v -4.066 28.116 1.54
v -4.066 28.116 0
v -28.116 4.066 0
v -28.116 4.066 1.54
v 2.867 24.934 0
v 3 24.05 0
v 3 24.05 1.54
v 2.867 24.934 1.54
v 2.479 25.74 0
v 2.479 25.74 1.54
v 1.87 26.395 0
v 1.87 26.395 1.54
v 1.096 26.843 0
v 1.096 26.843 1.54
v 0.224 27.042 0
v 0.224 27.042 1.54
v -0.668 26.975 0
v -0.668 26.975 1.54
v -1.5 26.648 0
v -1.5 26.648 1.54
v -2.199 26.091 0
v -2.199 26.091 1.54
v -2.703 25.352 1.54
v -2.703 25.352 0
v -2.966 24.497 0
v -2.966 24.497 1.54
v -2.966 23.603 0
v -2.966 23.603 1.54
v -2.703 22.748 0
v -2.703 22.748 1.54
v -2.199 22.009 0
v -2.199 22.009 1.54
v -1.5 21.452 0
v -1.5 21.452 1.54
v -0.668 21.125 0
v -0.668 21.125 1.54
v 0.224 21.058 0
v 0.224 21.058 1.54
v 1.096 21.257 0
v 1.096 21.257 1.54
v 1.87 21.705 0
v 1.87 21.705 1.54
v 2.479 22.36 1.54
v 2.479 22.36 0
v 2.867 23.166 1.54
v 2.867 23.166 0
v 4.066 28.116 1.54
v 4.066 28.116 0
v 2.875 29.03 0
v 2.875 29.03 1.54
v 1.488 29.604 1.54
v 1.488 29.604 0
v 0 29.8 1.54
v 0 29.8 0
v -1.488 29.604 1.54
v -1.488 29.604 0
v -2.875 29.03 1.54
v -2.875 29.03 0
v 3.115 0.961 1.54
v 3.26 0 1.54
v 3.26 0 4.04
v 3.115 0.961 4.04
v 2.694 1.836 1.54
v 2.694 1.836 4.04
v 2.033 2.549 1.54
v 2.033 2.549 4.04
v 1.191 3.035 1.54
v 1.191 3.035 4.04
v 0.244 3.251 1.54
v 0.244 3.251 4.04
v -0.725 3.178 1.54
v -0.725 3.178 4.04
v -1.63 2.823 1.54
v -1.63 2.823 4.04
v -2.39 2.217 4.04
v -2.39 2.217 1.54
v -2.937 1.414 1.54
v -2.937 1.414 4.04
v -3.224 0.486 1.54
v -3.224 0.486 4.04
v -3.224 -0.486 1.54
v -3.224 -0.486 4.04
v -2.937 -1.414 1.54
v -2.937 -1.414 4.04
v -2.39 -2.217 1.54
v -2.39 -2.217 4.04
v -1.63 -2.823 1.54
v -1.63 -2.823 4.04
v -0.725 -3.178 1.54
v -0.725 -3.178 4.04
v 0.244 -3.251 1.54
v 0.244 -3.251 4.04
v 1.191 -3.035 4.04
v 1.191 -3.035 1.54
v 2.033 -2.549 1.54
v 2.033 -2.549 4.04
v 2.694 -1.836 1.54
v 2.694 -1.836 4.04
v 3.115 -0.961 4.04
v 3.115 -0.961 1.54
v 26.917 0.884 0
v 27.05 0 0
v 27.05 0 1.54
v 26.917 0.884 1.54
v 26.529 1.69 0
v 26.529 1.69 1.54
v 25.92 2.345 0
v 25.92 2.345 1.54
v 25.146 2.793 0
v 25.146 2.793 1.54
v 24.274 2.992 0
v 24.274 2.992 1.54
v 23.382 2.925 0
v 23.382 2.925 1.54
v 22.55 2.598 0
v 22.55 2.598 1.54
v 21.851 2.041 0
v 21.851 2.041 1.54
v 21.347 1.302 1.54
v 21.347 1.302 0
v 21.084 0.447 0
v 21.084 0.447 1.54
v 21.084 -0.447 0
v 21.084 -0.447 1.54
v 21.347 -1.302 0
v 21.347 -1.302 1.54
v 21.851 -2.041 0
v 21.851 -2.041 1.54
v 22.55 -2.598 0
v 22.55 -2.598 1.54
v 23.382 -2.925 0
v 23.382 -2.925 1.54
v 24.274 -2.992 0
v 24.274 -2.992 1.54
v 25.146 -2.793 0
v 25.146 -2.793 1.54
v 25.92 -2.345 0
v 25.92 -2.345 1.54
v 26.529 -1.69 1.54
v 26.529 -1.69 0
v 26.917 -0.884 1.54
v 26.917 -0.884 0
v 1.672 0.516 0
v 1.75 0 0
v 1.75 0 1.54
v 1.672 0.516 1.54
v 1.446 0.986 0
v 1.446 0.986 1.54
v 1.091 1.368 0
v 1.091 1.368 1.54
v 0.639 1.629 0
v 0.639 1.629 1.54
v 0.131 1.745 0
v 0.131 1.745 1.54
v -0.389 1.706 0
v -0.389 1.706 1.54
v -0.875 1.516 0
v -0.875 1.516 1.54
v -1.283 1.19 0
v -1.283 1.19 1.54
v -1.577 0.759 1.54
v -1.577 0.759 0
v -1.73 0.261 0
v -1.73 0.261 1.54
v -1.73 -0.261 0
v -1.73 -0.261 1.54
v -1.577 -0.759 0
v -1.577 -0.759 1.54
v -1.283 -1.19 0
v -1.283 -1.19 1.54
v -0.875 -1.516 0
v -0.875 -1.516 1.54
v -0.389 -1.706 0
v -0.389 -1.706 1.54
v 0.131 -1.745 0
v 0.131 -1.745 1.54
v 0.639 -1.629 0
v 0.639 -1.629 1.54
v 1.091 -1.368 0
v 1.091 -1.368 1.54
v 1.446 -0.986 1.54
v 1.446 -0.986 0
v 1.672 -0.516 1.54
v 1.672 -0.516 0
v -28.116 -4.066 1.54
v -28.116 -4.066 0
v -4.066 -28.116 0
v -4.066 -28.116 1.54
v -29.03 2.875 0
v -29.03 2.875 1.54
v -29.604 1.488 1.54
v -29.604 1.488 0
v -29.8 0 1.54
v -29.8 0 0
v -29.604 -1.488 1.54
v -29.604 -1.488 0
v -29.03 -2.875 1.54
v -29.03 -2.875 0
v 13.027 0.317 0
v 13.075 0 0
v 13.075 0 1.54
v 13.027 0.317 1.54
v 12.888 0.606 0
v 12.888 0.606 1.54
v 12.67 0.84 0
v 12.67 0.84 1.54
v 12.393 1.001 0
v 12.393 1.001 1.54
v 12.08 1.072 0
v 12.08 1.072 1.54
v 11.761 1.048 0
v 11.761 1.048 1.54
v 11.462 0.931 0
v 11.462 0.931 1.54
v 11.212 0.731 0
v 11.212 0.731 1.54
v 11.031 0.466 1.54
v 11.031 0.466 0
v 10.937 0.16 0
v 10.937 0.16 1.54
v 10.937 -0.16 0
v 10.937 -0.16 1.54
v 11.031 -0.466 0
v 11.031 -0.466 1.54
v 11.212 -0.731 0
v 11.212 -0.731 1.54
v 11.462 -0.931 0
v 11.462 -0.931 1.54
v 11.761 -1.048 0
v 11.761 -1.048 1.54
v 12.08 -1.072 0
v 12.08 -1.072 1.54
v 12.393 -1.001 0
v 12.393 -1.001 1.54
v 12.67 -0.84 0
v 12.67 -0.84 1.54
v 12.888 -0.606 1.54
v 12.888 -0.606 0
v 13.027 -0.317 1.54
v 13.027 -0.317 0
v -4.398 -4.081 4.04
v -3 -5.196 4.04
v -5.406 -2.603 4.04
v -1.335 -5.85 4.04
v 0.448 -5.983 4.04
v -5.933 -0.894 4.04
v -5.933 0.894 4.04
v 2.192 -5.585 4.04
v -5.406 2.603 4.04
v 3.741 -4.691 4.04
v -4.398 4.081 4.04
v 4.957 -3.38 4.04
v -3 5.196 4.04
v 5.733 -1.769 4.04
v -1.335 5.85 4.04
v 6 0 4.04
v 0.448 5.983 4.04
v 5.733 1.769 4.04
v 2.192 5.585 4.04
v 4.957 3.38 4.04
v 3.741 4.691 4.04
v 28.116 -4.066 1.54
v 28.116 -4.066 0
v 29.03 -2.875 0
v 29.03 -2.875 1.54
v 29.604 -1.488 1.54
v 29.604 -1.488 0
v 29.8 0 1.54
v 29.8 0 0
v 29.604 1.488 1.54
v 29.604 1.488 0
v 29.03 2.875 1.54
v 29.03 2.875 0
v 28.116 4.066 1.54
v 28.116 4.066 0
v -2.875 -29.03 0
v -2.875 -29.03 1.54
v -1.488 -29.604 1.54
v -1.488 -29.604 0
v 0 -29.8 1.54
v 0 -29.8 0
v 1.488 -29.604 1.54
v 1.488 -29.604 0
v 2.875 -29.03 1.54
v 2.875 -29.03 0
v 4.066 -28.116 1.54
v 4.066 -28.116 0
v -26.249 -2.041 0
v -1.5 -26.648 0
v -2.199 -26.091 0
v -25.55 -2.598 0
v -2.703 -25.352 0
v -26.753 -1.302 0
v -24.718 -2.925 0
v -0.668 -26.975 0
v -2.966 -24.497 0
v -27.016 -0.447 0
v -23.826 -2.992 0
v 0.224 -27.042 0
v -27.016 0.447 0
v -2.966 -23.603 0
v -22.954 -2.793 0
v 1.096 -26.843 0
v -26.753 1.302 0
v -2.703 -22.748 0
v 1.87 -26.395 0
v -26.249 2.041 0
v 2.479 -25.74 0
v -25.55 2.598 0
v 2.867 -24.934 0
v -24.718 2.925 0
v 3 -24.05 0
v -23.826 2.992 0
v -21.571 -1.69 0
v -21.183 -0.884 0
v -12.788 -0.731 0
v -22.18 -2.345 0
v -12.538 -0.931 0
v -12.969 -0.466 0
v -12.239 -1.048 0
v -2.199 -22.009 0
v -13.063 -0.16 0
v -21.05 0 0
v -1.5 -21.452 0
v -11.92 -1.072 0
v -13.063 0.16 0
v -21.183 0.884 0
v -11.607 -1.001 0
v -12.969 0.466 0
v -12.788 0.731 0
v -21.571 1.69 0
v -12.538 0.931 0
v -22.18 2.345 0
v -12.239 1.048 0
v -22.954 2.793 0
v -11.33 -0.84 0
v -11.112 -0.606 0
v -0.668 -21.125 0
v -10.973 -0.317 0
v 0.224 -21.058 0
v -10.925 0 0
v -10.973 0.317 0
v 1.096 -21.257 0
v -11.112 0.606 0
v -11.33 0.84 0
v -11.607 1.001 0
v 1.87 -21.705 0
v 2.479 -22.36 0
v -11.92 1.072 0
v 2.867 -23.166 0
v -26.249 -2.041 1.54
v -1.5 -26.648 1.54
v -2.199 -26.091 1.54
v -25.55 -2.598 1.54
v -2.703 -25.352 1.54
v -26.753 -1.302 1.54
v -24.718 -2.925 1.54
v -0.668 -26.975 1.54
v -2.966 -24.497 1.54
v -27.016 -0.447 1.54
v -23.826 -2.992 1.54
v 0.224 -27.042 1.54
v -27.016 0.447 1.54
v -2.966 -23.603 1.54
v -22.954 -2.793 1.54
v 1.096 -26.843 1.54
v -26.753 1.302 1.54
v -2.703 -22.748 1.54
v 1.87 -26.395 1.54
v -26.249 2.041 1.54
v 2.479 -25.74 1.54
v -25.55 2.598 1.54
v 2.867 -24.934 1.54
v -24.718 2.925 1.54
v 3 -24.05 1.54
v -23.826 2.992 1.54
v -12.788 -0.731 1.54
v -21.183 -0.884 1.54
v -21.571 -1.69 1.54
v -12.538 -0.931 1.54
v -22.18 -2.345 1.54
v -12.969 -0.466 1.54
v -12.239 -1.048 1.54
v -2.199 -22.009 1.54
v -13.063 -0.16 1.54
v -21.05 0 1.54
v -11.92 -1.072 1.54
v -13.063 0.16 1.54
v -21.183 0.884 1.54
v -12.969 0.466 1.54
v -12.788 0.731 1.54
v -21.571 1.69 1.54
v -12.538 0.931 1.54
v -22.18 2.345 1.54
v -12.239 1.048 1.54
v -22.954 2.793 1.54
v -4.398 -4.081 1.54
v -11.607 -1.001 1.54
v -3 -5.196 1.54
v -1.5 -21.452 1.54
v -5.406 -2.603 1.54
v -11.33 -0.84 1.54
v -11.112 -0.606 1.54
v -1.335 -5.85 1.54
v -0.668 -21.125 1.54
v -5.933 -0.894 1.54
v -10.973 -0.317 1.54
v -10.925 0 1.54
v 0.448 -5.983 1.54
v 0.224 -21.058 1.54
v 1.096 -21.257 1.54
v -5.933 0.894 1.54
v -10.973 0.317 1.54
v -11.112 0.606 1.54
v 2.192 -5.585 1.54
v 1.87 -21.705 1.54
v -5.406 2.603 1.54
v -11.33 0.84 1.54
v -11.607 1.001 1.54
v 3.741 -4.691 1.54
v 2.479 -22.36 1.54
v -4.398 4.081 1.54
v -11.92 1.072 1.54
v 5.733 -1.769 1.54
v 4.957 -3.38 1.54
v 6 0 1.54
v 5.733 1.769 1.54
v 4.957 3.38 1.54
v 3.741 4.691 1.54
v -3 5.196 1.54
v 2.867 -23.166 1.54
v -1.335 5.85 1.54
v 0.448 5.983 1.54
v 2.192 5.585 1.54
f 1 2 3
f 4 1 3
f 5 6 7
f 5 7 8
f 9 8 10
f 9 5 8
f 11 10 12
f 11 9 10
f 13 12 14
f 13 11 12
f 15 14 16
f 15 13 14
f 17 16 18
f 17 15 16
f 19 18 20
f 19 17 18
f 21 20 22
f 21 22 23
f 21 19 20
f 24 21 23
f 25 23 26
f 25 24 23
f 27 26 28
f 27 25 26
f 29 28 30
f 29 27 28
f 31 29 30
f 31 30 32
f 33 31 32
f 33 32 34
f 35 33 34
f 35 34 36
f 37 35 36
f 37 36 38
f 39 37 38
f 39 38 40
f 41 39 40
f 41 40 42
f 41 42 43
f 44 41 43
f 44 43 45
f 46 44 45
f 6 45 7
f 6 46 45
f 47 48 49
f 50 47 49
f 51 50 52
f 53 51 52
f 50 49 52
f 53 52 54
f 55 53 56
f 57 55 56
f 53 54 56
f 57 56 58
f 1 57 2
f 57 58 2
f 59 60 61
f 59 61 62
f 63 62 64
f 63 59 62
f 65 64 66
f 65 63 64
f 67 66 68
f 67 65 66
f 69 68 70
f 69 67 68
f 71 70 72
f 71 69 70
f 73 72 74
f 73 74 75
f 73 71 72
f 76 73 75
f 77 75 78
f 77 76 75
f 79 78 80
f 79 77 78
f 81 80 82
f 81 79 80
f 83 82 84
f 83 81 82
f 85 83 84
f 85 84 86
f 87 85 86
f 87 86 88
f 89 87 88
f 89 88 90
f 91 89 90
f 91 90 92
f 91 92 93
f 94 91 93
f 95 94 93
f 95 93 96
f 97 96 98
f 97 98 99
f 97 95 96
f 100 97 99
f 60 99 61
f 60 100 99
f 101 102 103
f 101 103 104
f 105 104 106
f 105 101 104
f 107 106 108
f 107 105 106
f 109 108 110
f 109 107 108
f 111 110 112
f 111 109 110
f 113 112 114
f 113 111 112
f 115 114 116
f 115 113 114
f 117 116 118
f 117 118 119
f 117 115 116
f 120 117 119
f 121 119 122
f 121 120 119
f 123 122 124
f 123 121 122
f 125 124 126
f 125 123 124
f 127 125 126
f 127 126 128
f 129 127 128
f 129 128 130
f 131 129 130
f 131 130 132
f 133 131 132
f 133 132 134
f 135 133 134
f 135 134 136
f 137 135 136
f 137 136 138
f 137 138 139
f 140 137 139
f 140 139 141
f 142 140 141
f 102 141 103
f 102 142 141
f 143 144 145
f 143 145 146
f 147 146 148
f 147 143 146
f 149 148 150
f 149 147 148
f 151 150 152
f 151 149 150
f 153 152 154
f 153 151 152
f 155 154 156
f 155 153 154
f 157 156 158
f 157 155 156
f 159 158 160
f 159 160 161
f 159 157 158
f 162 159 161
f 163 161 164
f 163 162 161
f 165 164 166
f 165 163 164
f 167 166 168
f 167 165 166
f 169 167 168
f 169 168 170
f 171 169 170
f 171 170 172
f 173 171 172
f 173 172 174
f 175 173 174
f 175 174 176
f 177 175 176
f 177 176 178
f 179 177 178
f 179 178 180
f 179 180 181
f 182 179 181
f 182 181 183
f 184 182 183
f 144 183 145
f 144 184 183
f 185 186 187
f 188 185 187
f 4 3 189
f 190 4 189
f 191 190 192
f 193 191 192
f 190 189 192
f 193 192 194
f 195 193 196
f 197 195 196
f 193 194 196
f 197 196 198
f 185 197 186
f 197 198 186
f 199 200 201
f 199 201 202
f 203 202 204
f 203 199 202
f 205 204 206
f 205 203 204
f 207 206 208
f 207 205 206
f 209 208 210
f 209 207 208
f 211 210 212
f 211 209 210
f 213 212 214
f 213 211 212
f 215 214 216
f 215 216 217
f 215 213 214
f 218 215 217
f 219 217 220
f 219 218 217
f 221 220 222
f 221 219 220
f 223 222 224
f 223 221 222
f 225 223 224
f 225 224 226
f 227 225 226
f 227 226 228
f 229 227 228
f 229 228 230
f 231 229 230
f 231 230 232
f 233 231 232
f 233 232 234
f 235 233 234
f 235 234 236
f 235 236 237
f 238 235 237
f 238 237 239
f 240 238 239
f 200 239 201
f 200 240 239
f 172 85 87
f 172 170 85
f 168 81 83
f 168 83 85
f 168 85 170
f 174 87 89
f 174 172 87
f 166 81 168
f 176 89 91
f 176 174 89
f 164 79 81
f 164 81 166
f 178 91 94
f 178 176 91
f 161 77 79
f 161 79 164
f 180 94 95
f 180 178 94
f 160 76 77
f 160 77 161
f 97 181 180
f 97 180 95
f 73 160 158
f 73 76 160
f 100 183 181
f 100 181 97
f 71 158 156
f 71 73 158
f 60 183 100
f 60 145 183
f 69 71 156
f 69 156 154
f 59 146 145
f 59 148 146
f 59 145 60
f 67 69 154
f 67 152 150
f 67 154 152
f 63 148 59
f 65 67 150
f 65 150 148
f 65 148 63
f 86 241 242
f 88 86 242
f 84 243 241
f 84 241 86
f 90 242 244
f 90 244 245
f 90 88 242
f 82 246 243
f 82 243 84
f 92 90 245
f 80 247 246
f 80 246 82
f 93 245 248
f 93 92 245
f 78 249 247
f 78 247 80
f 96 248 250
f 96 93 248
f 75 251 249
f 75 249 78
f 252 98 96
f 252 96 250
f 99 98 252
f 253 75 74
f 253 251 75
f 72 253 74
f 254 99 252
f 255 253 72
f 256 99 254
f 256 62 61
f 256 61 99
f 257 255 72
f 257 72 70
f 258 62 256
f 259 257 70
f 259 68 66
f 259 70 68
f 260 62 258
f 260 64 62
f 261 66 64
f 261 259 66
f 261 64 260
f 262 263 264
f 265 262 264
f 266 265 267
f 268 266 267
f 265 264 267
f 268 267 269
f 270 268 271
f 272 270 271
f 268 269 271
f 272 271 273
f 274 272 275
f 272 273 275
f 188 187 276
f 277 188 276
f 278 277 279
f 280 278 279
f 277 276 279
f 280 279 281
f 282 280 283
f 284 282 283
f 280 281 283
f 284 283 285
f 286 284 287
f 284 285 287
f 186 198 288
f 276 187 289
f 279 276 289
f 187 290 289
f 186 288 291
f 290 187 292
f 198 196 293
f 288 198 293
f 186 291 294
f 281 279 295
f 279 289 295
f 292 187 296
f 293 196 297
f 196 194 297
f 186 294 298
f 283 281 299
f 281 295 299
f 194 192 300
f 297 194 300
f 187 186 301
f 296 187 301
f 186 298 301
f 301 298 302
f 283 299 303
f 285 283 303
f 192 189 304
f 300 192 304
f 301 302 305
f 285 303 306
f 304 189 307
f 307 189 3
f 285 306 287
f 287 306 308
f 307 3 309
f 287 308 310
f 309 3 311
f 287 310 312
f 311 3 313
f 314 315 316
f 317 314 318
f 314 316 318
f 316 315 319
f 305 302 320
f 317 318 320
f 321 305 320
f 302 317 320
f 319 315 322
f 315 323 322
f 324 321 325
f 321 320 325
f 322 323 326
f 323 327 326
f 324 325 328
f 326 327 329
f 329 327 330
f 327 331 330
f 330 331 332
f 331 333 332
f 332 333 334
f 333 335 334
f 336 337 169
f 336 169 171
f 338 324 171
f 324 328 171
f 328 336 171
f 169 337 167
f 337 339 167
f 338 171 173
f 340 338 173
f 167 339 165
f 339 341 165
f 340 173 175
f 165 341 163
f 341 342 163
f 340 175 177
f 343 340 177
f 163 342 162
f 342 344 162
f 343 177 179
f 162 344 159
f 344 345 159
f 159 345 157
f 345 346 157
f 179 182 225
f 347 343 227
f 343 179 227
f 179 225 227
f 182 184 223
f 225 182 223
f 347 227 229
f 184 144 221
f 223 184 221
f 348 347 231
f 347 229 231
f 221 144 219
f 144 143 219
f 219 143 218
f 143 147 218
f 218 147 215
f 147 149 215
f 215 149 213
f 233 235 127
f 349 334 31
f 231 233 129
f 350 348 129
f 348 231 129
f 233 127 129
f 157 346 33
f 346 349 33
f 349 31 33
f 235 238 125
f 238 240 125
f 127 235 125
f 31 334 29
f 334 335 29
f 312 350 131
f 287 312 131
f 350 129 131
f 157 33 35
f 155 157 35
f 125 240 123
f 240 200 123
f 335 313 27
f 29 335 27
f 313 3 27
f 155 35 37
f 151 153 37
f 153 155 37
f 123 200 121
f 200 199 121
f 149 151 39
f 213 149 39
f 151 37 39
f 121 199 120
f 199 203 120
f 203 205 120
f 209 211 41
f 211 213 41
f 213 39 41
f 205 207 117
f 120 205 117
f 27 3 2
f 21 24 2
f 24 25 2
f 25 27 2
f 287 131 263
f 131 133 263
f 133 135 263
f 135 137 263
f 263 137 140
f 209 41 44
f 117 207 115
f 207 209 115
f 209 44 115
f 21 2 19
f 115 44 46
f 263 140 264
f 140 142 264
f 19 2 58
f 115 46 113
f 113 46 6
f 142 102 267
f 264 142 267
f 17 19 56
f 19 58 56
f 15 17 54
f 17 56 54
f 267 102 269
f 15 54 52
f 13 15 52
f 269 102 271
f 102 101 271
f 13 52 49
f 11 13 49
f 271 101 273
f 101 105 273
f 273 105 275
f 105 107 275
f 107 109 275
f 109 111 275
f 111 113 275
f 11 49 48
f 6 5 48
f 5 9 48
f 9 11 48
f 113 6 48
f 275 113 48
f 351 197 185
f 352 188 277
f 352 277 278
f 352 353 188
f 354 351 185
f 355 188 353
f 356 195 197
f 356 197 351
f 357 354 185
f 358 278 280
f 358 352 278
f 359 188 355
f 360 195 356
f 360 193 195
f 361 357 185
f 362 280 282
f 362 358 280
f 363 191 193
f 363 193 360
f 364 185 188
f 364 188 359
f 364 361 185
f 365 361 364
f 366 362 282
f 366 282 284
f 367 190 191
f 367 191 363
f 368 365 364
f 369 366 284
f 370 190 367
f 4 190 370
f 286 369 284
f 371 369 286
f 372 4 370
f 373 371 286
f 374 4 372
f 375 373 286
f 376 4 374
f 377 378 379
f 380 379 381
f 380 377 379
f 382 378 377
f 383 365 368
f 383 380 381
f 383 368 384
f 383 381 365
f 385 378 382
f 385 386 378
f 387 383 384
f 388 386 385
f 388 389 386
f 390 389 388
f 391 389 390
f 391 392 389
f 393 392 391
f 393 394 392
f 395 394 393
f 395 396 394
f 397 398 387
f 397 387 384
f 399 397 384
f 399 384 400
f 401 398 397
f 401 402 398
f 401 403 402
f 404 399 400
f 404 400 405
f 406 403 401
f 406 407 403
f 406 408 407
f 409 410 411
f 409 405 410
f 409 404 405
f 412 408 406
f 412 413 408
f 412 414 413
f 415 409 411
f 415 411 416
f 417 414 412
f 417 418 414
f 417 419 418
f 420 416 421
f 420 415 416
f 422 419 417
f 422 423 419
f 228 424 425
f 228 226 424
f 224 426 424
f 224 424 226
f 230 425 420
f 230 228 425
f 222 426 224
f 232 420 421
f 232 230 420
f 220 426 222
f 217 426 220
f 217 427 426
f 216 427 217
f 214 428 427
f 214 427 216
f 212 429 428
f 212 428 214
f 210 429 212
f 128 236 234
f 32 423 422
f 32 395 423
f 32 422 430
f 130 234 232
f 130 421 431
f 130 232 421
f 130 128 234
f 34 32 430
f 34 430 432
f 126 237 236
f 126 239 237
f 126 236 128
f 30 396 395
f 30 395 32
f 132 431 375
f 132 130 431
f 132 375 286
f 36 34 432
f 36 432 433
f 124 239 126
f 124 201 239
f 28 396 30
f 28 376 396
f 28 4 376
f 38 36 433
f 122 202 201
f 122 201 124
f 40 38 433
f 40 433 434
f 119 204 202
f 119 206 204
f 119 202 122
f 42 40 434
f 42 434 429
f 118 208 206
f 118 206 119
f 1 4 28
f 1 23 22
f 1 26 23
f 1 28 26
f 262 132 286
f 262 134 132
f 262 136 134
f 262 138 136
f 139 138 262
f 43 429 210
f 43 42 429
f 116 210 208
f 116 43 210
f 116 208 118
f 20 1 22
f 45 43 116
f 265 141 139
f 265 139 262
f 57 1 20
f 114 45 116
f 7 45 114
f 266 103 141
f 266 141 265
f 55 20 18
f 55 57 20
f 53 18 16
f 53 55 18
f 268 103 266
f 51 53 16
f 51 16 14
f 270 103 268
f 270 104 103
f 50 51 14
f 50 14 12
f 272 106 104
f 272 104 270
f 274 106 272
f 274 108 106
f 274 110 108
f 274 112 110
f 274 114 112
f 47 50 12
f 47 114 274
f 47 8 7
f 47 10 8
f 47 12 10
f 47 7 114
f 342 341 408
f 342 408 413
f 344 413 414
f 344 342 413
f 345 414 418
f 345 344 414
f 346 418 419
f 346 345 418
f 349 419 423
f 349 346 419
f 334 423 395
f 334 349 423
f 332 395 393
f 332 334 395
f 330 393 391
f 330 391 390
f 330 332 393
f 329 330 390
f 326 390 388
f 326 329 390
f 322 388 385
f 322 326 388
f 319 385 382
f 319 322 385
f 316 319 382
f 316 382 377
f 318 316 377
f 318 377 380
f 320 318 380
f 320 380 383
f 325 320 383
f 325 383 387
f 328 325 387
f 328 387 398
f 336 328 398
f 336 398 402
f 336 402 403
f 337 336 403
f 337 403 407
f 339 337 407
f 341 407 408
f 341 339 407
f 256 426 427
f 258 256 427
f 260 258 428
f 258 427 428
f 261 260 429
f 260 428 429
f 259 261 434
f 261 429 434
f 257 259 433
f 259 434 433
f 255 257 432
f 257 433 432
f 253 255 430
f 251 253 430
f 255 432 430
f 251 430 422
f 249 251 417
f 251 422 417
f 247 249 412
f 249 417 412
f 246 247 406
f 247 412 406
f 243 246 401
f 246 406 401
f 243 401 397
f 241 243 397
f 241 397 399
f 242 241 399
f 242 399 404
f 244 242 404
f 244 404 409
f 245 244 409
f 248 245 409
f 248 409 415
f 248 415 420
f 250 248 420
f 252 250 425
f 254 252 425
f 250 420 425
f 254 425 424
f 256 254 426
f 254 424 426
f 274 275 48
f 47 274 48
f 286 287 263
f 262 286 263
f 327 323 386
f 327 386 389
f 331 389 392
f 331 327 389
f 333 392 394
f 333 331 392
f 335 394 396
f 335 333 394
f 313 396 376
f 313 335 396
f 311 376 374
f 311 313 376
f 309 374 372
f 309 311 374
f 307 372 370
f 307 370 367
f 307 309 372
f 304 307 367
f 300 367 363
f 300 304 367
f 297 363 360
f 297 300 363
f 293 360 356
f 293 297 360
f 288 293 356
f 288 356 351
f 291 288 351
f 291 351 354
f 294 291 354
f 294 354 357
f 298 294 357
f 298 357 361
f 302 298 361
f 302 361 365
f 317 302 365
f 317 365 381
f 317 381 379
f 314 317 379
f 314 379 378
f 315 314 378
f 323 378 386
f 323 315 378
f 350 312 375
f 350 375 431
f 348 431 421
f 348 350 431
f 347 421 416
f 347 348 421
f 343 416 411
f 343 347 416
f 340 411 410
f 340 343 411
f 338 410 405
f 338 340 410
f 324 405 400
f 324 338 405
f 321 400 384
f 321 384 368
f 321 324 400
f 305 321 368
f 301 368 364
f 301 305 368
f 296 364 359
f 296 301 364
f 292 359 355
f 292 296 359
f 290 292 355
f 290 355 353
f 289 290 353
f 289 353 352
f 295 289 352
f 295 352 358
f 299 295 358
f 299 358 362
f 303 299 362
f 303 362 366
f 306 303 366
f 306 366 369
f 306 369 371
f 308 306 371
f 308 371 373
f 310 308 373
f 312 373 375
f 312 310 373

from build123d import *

# Parameters (mm, degrees)
F0_R     = 3
F0_R_2   = 1.075
F0_R_3   = 1.75
F1_DEPTH = 1.54
F2_R     = 6
F2_R_2   = 3.26
F3_DEPTH = 2.5


with BuildPart() as f1:
    # F0 (on Top) → F1 (new body)
    with BuildSketch(Plane.XY):
        with BuildLine():
            Line((28.115864, 4.065864), (4.065864, 28.115864))
            ThreePointArc((4.065864, 28.115864), (0, 29.8), (-4.065864, 28.115864))
            Line((-4.065864, 28.115864), (-28.115864, 4.065864))
            ThreePointArc((-28.115864, 4.065864), (-29.8, 0), (-28.115864, -4.065864))
            Line((-28.115864, -4.065864), (-4.065864, -28.115864))
            ThreePointArc((-4.065864, -28.115864), (0, -29.8), (4.065864, -28.115864))
            Line((4.065864, -28.115864), (28.115864, -4.065864))
            ThreePointArc((28.115864, -4.065864), (29.8, 0), (28.115864, 4.065864))
        make_face()
        with Locations((-24.05, 0)):
            Circle(F0_R, mode=Mode.SUBTRACT)
        with Locations((-12, 0)):
            Circle(F0_R_2, mode=Mode.SUBTRACT)
        with Locations((0, -24.05)):
            Circle(F0_R, mode=Mode.SUBTRACT)
        Circle(F0_R_3, mode=Mode.SUBTRACT)
        with Locations((12, 0)):
            Circle(F0_R_2, mode=Mode.SUBTRACT)
        with Locations((24.05, 0)):
            Circle(F0_R, mode=Mode.SUBTRACT)
        with Locations((0, 24.05)):
            Circle(F0_R, mode=Mode.SUBTRACT)
    extrude(amount=F1_DEPTH)

    # F2 (on face) → F3 (join)
    with BuildSketch(Plane.XY.offset(1.54)):
        Circle(F2_R)
        Circle(F2_R_2, mode=Mode.SUBTRACT)
    extrude(amount=F3_DEPTH)


solid = f1.part
